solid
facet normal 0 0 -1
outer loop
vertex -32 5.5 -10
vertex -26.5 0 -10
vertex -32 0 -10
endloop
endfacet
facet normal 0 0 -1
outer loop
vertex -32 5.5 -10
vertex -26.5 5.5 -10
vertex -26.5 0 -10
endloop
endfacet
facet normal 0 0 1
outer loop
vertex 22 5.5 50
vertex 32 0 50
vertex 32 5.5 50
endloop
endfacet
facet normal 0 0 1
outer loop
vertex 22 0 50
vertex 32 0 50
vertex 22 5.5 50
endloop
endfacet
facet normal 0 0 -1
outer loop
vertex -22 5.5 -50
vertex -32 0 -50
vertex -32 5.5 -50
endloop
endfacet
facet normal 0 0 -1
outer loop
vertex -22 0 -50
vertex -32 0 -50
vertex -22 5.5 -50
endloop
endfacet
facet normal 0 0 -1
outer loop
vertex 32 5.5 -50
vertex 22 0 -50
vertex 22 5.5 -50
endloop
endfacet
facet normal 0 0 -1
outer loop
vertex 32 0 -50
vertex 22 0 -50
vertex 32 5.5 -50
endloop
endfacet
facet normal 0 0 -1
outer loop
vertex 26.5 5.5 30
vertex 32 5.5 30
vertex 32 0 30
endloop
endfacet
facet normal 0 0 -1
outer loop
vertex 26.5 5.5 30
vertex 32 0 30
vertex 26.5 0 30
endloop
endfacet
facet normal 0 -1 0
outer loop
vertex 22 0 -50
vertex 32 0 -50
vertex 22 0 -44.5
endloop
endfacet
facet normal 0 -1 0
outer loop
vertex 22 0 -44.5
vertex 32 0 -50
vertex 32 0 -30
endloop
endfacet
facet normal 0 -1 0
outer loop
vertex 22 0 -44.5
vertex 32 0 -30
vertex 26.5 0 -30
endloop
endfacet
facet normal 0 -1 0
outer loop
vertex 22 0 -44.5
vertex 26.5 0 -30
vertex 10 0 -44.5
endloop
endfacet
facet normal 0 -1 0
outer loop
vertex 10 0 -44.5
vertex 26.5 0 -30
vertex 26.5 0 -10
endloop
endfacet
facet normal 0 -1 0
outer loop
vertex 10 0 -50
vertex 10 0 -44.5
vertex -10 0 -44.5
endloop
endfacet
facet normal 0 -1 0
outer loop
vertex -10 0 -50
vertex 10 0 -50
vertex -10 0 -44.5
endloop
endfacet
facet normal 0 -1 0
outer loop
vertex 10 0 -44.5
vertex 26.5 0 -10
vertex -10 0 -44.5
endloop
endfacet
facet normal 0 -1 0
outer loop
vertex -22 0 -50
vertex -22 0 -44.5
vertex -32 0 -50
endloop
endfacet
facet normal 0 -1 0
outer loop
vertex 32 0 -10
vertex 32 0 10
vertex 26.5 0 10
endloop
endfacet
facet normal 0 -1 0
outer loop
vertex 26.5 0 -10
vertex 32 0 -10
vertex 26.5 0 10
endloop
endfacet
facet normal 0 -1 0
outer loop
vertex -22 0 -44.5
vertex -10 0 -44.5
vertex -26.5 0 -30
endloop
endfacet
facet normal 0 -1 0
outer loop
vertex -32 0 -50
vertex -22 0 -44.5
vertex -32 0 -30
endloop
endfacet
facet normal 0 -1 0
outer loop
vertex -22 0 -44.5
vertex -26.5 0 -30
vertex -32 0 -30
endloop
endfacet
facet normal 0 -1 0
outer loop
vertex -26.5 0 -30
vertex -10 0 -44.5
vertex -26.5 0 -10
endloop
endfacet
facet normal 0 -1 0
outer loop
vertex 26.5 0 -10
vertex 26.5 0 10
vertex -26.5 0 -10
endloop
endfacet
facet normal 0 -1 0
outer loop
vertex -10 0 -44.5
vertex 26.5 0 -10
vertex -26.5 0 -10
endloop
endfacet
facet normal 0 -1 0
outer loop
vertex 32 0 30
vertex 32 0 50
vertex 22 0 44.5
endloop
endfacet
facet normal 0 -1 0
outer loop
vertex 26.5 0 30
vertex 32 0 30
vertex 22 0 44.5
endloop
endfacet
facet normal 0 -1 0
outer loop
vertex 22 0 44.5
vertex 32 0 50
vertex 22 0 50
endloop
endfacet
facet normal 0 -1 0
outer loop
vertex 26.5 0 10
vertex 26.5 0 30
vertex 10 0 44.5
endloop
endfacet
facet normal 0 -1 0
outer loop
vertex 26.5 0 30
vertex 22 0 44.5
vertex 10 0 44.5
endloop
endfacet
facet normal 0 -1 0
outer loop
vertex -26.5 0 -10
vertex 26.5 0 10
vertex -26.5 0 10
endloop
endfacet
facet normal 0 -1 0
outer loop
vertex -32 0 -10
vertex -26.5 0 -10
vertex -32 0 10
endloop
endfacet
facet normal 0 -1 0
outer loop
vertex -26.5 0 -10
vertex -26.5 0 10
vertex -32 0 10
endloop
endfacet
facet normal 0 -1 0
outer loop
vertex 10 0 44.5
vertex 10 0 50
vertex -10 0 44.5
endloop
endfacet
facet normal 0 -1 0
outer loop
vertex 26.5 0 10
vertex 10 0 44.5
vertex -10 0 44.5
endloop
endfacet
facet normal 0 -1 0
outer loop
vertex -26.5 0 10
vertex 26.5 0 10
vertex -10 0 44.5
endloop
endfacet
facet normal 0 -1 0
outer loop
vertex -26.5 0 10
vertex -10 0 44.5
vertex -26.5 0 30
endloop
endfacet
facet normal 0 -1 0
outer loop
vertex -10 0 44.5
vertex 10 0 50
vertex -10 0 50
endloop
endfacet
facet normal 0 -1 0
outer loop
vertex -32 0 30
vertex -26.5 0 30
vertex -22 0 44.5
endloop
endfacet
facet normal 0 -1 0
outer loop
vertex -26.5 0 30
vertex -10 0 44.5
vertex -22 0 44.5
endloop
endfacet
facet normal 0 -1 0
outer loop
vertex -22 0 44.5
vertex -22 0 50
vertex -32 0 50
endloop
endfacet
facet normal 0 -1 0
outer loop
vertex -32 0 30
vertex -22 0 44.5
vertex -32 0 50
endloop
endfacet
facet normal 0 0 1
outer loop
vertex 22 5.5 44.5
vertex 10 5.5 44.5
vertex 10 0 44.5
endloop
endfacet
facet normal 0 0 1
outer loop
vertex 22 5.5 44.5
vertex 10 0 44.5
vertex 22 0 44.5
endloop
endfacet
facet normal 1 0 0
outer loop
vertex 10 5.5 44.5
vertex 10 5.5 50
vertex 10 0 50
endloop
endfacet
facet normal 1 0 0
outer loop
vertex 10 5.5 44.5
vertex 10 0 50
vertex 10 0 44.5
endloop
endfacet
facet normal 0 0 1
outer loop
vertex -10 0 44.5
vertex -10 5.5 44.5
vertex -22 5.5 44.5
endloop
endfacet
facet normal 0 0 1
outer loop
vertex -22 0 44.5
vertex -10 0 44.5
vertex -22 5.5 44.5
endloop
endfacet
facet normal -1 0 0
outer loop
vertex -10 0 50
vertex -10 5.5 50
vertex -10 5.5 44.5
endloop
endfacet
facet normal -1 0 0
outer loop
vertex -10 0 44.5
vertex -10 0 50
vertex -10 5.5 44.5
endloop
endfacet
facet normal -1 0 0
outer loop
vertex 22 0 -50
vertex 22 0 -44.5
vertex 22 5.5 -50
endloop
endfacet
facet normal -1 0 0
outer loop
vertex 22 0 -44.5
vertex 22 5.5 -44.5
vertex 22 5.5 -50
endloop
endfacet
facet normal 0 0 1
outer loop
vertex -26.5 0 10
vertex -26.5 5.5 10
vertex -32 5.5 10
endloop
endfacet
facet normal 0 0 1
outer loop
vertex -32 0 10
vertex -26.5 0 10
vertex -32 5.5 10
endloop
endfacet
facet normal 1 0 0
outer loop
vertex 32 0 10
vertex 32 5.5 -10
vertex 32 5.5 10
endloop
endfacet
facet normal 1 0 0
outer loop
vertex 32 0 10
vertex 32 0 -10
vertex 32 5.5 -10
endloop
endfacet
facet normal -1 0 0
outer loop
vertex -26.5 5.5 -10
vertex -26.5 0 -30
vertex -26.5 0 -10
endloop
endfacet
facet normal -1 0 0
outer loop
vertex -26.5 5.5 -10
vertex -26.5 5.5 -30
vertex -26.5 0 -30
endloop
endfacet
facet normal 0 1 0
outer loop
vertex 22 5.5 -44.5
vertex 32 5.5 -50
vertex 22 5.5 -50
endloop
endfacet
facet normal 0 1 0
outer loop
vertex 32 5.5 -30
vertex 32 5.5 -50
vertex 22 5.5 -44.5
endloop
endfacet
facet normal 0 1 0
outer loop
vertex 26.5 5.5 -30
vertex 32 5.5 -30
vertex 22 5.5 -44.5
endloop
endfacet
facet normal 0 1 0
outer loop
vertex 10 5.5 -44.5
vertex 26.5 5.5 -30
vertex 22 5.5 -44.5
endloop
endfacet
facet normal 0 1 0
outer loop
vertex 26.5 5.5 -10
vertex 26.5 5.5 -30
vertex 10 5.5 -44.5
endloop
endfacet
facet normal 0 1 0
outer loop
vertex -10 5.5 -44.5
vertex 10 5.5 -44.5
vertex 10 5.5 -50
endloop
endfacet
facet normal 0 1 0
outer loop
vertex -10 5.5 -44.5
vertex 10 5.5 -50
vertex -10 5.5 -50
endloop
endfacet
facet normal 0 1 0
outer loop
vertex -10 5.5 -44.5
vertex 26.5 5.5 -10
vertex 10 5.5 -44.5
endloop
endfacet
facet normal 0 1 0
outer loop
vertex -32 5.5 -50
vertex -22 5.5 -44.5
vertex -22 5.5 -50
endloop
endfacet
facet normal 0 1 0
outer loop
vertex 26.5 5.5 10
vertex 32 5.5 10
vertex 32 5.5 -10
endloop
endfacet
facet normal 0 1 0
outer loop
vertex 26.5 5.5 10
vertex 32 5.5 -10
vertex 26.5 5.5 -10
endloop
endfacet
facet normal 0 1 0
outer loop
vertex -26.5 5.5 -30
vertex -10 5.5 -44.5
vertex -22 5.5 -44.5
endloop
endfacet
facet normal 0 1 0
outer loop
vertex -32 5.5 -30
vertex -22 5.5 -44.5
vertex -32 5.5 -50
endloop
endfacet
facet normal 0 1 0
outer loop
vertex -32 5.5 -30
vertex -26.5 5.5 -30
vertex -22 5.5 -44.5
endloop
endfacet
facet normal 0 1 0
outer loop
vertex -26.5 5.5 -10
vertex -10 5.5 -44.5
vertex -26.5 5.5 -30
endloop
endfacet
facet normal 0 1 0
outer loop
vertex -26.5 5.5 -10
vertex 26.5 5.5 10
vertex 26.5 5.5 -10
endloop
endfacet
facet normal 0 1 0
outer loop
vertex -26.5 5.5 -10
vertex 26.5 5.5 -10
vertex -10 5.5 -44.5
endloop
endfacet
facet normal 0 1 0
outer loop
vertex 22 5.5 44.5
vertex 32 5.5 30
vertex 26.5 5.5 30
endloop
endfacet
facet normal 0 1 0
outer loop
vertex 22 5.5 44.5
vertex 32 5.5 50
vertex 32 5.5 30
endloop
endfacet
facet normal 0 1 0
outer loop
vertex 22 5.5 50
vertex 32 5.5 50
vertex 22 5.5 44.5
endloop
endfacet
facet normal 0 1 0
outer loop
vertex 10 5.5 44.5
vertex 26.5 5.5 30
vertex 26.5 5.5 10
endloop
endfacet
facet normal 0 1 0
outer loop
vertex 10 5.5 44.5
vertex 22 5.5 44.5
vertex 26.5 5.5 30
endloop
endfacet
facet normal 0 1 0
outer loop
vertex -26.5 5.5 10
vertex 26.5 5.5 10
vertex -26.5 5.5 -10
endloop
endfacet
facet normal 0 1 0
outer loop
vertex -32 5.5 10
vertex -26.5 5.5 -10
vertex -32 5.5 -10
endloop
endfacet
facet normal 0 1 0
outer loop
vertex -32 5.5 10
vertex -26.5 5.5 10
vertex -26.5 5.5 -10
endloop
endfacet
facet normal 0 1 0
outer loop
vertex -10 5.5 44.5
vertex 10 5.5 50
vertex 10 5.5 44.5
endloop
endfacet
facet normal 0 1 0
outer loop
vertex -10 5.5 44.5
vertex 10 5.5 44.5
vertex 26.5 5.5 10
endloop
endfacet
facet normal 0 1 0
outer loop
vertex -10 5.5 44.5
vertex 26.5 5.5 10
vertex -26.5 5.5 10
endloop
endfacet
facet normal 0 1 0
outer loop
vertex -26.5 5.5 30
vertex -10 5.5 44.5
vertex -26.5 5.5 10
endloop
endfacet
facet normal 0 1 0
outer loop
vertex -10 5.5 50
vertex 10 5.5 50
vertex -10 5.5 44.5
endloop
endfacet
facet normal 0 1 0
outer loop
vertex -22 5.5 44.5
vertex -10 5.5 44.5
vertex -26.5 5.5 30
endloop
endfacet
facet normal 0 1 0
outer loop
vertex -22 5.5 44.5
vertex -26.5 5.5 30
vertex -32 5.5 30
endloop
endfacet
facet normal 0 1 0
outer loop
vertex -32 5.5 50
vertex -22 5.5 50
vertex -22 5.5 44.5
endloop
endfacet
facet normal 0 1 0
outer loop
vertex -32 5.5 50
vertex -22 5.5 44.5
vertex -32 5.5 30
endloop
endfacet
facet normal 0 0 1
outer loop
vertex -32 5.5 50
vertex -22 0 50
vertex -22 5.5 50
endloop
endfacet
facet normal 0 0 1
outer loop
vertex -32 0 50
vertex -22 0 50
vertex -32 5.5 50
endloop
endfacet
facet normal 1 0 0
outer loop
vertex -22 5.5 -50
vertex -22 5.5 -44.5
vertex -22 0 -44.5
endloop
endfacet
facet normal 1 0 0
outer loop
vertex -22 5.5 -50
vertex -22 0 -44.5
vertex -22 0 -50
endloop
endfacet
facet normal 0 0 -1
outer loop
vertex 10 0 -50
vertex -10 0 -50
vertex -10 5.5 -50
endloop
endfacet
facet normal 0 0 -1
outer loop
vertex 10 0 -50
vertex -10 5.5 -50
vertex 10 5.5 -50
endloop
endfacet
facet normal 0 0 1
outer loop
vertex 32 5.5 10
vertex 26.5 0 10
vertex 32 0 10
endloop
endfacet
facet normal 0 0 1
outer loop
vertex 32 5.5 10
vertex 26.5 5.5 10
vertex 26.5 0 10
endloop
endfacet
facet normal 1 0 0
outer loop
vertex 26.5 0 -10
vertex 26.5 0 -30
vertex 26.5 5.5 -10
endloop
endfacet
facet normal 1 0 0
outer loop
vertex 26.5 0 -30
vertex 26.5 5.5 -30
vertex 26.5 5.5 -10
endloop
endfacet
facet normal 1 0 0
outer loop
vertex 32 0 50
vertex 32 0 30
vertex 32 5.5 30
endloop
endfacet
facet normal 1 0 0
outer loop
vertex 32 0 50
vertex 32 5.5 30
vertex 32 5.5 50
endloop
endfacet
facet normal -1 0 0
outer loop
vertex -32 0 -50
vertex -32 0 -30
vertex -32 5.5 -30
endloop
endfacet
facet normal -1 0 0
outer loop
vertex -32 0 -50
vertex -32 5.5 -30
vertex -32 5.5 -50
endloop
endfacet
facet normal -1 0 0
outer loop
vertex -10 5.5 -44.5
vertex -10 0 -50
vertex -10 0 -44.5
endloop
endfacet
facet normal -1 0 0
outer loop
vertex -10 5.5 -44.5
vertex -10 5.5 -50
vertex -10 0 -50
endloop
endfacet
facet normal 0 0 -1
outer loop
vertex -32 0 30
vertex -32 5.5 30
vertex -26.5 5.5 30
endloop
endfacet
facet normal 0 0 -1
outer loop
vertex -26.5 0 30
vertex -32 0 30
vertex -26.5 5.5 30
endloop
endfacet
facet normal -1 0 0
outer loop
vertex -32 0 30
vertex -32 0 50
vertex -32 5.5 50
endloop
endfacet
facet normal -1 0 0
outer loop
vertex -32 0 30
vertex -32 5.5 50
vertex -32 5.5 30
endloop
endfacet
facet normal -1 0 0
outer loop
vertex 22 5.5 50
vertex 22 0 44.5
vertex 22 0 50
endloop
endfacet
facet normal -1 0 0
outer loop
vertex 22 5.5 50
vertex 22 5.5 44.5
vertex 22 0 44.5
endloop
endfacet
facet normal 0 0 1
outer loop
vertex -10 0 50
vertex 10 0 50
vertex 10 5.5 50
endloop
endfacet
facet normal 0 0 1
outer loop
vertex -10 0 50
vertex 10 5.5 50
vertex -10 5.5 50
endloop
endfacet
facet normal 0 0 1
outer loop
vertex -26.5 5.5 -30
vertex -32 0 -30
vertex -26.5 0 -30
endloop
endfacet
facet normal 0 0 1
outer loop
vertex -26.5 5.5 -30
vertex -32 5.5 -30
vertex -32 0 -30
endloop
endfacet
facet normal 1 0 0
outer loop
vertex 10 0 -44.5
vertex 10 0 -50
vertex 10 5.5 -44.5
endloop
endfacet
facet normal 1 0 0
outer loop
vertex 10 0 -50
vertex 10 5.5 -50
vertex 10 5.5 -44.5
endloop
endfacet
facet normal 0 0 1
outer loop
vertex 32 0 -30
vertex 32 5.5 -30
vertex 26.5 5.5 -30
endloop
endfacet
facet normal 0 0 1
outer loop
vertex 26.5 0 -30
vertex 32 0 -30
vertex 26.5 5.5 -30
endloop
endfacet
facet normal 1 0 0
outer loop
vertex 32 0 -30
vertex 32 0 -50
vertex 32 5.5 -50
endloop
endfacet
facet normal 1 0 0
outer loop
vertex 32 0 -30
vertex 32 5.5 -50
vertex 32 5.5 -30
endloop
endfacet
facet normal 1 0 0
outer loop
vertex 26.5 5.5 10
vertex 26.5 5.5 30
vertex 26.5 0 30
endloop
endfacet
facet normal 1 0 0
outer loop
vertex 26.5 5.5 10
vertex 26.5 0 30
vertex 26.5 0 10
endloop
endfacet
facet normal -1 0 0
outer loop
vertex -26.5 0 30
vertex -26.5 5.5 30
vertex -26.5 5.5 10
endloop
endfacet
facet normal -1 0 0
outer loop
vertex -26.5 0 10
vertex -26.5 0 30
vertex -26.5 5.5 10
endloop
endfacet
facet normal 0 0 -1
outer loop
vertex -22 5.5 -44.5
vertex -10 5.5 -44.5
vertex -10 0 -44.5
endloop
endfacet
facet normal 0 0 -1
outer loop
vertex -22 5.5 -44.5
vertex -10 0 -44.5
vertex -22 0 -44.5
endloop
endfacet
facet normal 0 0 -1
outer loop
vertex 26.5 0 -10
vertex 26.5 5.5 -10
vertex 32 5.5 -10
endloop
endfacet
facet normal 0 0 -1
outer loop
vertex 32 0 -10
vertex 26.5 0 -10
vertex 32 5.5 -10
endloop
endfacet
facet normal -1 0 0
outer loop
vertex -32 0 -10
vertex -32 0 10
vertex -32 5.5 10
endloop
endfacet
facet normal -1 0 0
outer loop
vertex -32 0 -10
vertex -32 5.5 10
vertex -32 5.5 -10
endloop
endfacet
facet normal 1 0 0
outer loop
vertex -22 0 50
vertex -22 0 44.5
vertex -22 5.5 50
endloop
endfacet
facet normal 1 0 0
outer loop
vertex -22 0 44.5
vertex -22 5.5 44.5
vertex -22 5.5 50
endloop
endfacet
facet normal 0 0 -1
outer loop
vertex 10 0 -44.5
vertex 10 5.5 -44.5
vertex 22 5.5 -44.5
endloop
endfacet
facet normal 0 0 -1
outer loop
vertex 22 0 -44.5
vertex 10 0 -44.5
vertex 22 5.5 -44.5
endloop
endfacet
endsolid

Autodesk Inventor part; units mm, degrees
ref_plane "YZ Plane" through (0, 0, 0) normal (1, 0, 0) x (0, 1, 0)
ref_plane "XZ Plane" through (0, 0, 0) normal (0, 1, 0) x (-1, 0, 0)
ref_plane "XY Plane" through (0, 0, 0) normal (0, 0, 1) x (1, 0, 0)
sketch "Block1" plane through (0, 0, 0) normal (0, 0, 1) x (1, 0, 0)
  line L0 (-10.1, 50.1) -> (-10.1, 41.1)
  line L1 (-10.1, 41.1) -> (-21.9, 41.1)
  line L2 (-21.9, 41.1) -> (-21.9, 50.1)
  line L3 (-21.9, 50.1) -> (-35.6, 50.1)
  line L4 (-35.6, 50.1) -> (-35.6, 29.9)
  line L5 (-35.6, 29.9) -> (-26.6, 29.9)
  line L6 (-26.6, 29.9) -> (-26.6, 10.1)
  line L7 (-26.6, 10.1) -> (-35.6, 10.1)
  line L8 (-35.6, 10.1) -> (-35.6, -10.1)
  line L9 (-35.6, -10.1) -> (-26.6, -10.1)
  line L10 (-26.6, -10.1) -> (-26.6, -29.9)
  line L11 (-26.6, -29.9) -> (-35.6, -29.9)
  line L12 (-35.6, -29.9) -> (-35.6, -50.1)
  line L13 (-35.6, -50.1) -> (-21.9, -50.1)
  line L14 (-21.9, -50.1) -> (-21.9, -41.1)
  line L15 (-21.9, -41.1) -> (-10.1, -41.1)
  line L16 (-10.1, -41.1) -> (-10.1, -50.1)
  line L17 (-10.1, -50.1) -> (10.1, -50.1)
  line L18 (10.1, -50.1) -> (10.1, -41.1)
  line L19 (10.1, -41.1) -> (21.9, -41.1)
  line L20 (21.9, -41.1) -> (21.9, -50.1)
  line L21 (21.9, -50.1) -> (35.6, -50.1)
  line L22 (35.6, -50.1) -> (35.6, -29.9)
  line L23 (35.6, -29.9) -> (26.6, -29.9)
  line L24 (26.6, -29.9) -> (26.6, -10.1)
  line L25 (26.6, -10.1) -> (35.6, -10.1)
  line L26 (35.6, -10.1) -> (35.6, 10.1)
  line L27 (35.6, 10.1) -> (26.6, 10.1)
  line L28 (26.6, 10.1) -> (26.6, 29.9)
  line L29 (26.6, 29.9) -> (35.6, 29.9)
  line L30 (35.6, 29.9) -> (35.6, 50.1)
  line L31 (35.6, 50.1) -> (21.9, 50.1)
  line L32 (21.9, 50.1) -> (21.9, 41.1)
  line L33 (21.9, 41.1) -> (10.1, 41.1)
  line L34 (10.1, 41.1) -> (10.1, 50.1)
  line L35 (10.1, 50.1) -> (-10.1, 50.1)
  point P0 (0, 0)
sketch "Block2" plane through (0, 0, 0) normal (0, 0, 1) x (1, 0, 0)
  line L0 (-10.2, 50.2) -> (-10.2, 41.2)
  line L1 (-10.2, 41.2) -> (-21.8, 41.2)
  line L2 (-21.8, 41.2) -> (-21.8, 50.2)
  line L3 (-21.8, 50.2) -> (-35.7, 50.2)
  line L4 (-35.7, 50.2) -> (-35.7, 29.8)
  line L5 (-35.7, 29.8) -> (-26.7, 29.8)
  line L6 (-26.7, 29.8) -> (-26.7, 10.2)
  line L7 (-26.7, 10.2) -> (-35.7, 10.2)
  line L8 (-35.7, 10.2) -> (-35.7, -10.2)
  line L9 (-35.7, -10.2) -> (-26.7, -10.2)
  line L10 (-26.7, -10.2) -> (-26.7, -29.8)
  line L11 (-26.7, -29.8) -> (-35.7, -29.8)
  line L12 (-35.7, -29.8) -> (-35.7, -50.2)
  line L13 (-35.7, -50.2) -> (-21.8, -50.2)
  line L14 (-21.8, -50.2) -> (-21.8, -41.2)
  line L15 (-21.8, -41.2) -> (-10.2, -41.2)
  line L16 (-10.2, -41.2) -> (-10.2, -50.2)
  line L17 (-10.2, -50.2) -> (10.2, -50.2)
  line L18 (10.2, -50.2) -> (10.2, -41.2)
  line L19 (10.2, -41.2) -> (21.8, -41.2)
  line L20 (21.8, -41.2) -> (21.8, -50.2)
  line L21 (21.8, -50.2) -> (35.7, -50.2)
  line L22 (35.7, -50.2) -> (35.7, -29.8)
  line L23 (35.7, -29.8) -> (26.7, -29.8)
  line L24 (26.7, -29.8) -> (26.7, -10.2)
  line L25 (26.7, -10.2) -> (35.7, -10.2)
  line L26 (35.7, -10.2) -> (35.7, 10.2)
  line L27 (35.7, 10.2) -> (26.7, 10.2)
  line L28 (26.7, 10.2) -> (26.7, 29.8)
  line L29 (26.7, 29.8) -> (35.7, 29.8)
  line L30 (35.7, 29.8) -> (35.7, 50.2)
  line L31 (35.7, 50.2) -> (21.8, 50.2)
  line L32 (21.8, 50.2) -> (21.8, 41.2)
  line L33 (21.8, 41.2) -> (10.2, 41.2)
  line L34 (10.2, 41.2) -> (10.2, 50.2)
  line L35 (10.2, 50.2) -> (-10.2, 50.2)
  point P0 (0, 0)
sketch "Block3" plane through (0, 0, 0) normal (0, 0, 1) x (1, 0, 0)
  line L0 (-10.1, 50.1) -> (-10.1, 41.1)
  line L1 (-10.1, 41.1) -> (-21.9, 41.1)
  line L2 (-21.9, 41.1) -> (-21.9, 50.1)
  line L3 (-21.9, 50.1) -> (-35.6, 50.1)
  line L4 (-35.6, 50.1) -> (-35.6, 29.9)
  line L5 (-35.6, 29.9) -> (-26.6, 29.9)
  line L6 (-26.6, 29.9) -> (-26.6, 10.1)
  line L7 (-26.6, 10.1) -> (-35.6, 10.1)
  line L8 (-35.6, 10.1) -> (-35.6, -10.1)
  line L9 (-35.6, -10.1) -> (-26.6, -10.1)
  line L10 (-26.6, -10.1) -> (-26.6, -29.9)
  line L11 (-26.6, -29.9) -> (-35.6, -29.9)
  line L12 (-35.6, -29.9) -> (-35.6, -50.1)
  line L13 (-35.6, -50.1) -> (-21.9, -50.1)
  line L14 (-21.9, -50.1) -> (-21.9, -41.1)
  line L15 (-21.9, -41.1) -> (-10.1, -41.1)
  line L16 (-10.1, -41.1) -> (-10.1, -50.1)
  line L17 (-10.1, -50.1) -> (10.1, -50.1)
  line L18 (10.1, -50.1) -> (10.1, -41.1)
  line L19 (10.1, -41.1) -> (21.9, -41.1)
  line L20 (21.9, -41.1) -> (21.9, -50.1)
  line L21 (21.9, -50.1) -> (35.6, -50.1)
  line L22 (35.6, -50.1) -> (35.6, -29.9)
  line L23 (35.6, -29.9) -> (26.6, -29.9)
  line L24 (26.6, -29.9) -> (26.6, -10.1)
  line L25 (26.6, -10.1) -> (35.6, -10.1)
  line L26 (35.6, -10.1) -> (35.6, 10.1)
  line L27 (35.6, 10.1) -> (26.6, 10.1)
  line L28 (26.6, 10.1) -> (26.6, 29.9)
  line L29 (26.6, 29.9) -> (35.6, 29.9)
  line L30 (35.6, 29.9) -> (35.6, 50.1)
  line L31 (35.6, 50.1) -> (21.9, 50.1)
  line L32 (21.9, 50.1) -> (21.9, 41.1)
  line L33 (21.9, 41.1) -> (10.1, 41.1)
  line L34 (10.1, 41.1) -> (10.1, 50.1)
  line L35 (10.1, 50.1) -> (-10.1, 50.1)
  point P0 (0, 0)
sketch "Block4" plane through (0, 0, 0) normal (0, 0, 1) x (1, 0, 0)
  line L0 (-10.08, 50.08) -> (-10.08, 44.58)
  line L1 (-10.08, 44.58) -> (-21.92, 44.58)
  line L2 (-21.92, 44.58) -> (-21.92, 50.08)
  line L3 (-21.92, 50.08) -> (-32.08, 50.08)
  line L4 (-32.08, 50.08) -> (-32.08, 29.92)
  line L5 (-32.08, 29.92) -> (-26.58, 29.92)
  line L6 (-26.58, 29.92) -> (-26.58, 10.08)
  line L7 (-26.58, 10.08) -> (-32.08, 10.08)
  line L8 (-32.08, 10.08) -> (-32.08, -10.08)
  line L9 (-32.08, -10.08) -> (-26.58, -10.08)
  line L10 (-26.58, -10.08) -> (-26.58, -29.92)
  line L11 (-26.58, -29.92) -> (-32.08, -29.92)
  line L12 (-32.08, -29.92) -> (-32.08, -50.08)
  line L13 (-32.08, -50.08) -> (-21.92, -50.08)
  line L14 (-21.92, -50.08) -> (-21.92, -44.58)
  line L15 (-21.92, -44.58) -> (-10.08, -44.58)
  line L16 (-10.08, -44.58) -> (-10.08, -50.08)
  line L17 (-10.08, -50.08) -> (10.08, -50.08)
  line L18 (10.08, -50.08) -> (10.08, -44.58)
  line L19 (10.08, -44.58) -> (21.92, -44.58)
  line L20 (21.92, -44.58) -> (21.92, -50.08)
  line L21 (21.92, -50.08) -> (32.08, -50.08)
  line L22 (32.08, -50.08) -> (32.08, -29.92)
  line L23 (32.08, -29.92) -> (26.58, -29.92)
  line L24 (26.58, -29.92) -> (26.58, -10.08)
  line L25 (26.58, -10.08) -> (32.08, -10.08)
  line L26 (32.08, -10.08) -> (32.08, 10.08)
  line L27 (32.08, 10.08) -> (26.58, 10.08)
  line L28 (26.58, 10.08) -> (26.58, 29.92)
  line L29 (26.58, 29.92) -> (32.08, 29.92)
  line L30 (32.08, 29.92) -> (32.08, 50.08)
  line L31 (32.08, 50.08) -> (21.92, 50.08)
  line L32 (21.92, 50.08) -> (21.92, 44.58)
  line L33 (21.92, 44.58) -> (10.08, 44.58)
  line L34 (10.08, 44.58) -> (10.08, 50.08)
  line L35 (10.08, 50.08) -> (-10.08, 50.08)
  point P0 (0, 0)
sketch "Sketch1" plane through (0, 0, 0) normal (0, 1, 0) x (-1, 0, 0)
  line L0 (32, -50) -> (-32, -50)
  line L1 (-32, -50) -> (-32, 50)
  line L2 (-32, 50) -> (32, 50)
  line L3 (32, 50) -> (32, -50)
  line L4 (32, -50) -> (-32, 50) construction
  line L5 (-32, -50) -> (32, 50) construction
  point P0 (0, 0)
  dimension "d0" = 64
  dimension "d1" = 100
extrude "Extrusion1" add sketch "Sketch1" along normal blind 5.5
sketch "Sketch5" plane through (0, 5.5, 0) normal (0, 1, 0) x (1, 0, 0)
  line L0 (32, 50) -> (-32, 50) projected
  line L1 (-32, 50) -> (-32, -50) projected
  line L2 (-32, 30) -> (-26.5, 30)
  line L3 (-26.5, 30) -> (-26.5, 10)
  line L4 (-26.5, 10) -> (-32, 10)
  line L5 (-32, 10) -> (-32, 30)
  line L6 (-66.1027, 0) -> (147.4162, 0) projected
  line L7 (0, 70.495) -> (0, -72.2701) projected
  line L8 (-32, -30) -> (-26.5, -30)
  line L9 (-26.5, -30) -> (-26.5, -10)
  line L10 (-26.5, -10) -> (-32, -10)
  line L11 (-32, -10) -> (-32, -30)
  line L12 (32, 30) -> (26.5, 30)
  line L13 (26.5, 30) -> (26.5, 10)
  line L14 (26.5, 10) -> (32, 10)
  line L15 (32, 10) -> (32, 30)
  line L16 (32, -30) -> (26.5, -30)
  line L17 (26.5, -30) -> (26.5, -10)
  line L18 (26.5, -10) -> (32, -10)
  line L19 (32, -10) -> (32, -30)
  point P0 (0, 0)
  dimension "d12" = 20
  dimension "d13" = 20
  dimension "d14" = 5.5
extrude "Extrusion3" cut sketch "Sketch5" against normal through all contours L10 L9 L8 L1 | L2 L3 L4 L1 | L15 L14 L13 L12 | L16 L17 L18 L19
sketch "Sketch6" plane through (0, 5.5, 0) normal (0, 1, 0) x (1, 0, 0)
  line L0 (32, 50) -> (-32, 50) projected
  line L1 (-66.1027, 0) -> (147.4162, 0) projected
  line L2 (0, 70.495) -> (0, -72.2701) projected
  line L3 (-22, 50) -> (-10, 50)
  line L4 (-10, 50) -> (-10, 44.5)
  line L5 (-10, 44.5) -> (-22, 44.5)
  line L6 (-22, 44.5) -> (-22, 50)
  line L7 (22, 50) -> (10, 50)
  line L8 (10, 50) -> (10, 44.5)
  line L9 (10, 44.5) -> (22, 44.5)
  line L10 (22, 44.5) -> (22, 50)
  line L11 (-22, -50) -> (-10, -50)
  line L12 (-10, -50) -> (-10, -44.5)
  line L13 (-10, -44.5) -> (-22, -44.5)
  line L14 (-22, -44.5) -> (-22, -50)
  line L15 (10, -44.5) -> (22, -44.5)
  line L16 (22, -50) -> (10, -50)
  line L17 (10, -50) -> (10, -44.5)
  line L18 (22, -44.5) -> (22, -50)
  point P0 (0, 0)
  dimension "d17" = 5.5
  dimension "d18" = 12
  dimension "d19" = 20
extrude "Extrusion4" cut sketch "Sketch6" against normal through all
equation "\"d2\" = Wt"
equation "\"d14\" = Wt"
equation "\"d15\" = Wt"
equation "\"d17\" = Wt"
equation "\"d20\" = Wt"
equation "\"Wt\" = 5.5"
properties part number "holder_ceil_plate" material "Wood (Birch)"
